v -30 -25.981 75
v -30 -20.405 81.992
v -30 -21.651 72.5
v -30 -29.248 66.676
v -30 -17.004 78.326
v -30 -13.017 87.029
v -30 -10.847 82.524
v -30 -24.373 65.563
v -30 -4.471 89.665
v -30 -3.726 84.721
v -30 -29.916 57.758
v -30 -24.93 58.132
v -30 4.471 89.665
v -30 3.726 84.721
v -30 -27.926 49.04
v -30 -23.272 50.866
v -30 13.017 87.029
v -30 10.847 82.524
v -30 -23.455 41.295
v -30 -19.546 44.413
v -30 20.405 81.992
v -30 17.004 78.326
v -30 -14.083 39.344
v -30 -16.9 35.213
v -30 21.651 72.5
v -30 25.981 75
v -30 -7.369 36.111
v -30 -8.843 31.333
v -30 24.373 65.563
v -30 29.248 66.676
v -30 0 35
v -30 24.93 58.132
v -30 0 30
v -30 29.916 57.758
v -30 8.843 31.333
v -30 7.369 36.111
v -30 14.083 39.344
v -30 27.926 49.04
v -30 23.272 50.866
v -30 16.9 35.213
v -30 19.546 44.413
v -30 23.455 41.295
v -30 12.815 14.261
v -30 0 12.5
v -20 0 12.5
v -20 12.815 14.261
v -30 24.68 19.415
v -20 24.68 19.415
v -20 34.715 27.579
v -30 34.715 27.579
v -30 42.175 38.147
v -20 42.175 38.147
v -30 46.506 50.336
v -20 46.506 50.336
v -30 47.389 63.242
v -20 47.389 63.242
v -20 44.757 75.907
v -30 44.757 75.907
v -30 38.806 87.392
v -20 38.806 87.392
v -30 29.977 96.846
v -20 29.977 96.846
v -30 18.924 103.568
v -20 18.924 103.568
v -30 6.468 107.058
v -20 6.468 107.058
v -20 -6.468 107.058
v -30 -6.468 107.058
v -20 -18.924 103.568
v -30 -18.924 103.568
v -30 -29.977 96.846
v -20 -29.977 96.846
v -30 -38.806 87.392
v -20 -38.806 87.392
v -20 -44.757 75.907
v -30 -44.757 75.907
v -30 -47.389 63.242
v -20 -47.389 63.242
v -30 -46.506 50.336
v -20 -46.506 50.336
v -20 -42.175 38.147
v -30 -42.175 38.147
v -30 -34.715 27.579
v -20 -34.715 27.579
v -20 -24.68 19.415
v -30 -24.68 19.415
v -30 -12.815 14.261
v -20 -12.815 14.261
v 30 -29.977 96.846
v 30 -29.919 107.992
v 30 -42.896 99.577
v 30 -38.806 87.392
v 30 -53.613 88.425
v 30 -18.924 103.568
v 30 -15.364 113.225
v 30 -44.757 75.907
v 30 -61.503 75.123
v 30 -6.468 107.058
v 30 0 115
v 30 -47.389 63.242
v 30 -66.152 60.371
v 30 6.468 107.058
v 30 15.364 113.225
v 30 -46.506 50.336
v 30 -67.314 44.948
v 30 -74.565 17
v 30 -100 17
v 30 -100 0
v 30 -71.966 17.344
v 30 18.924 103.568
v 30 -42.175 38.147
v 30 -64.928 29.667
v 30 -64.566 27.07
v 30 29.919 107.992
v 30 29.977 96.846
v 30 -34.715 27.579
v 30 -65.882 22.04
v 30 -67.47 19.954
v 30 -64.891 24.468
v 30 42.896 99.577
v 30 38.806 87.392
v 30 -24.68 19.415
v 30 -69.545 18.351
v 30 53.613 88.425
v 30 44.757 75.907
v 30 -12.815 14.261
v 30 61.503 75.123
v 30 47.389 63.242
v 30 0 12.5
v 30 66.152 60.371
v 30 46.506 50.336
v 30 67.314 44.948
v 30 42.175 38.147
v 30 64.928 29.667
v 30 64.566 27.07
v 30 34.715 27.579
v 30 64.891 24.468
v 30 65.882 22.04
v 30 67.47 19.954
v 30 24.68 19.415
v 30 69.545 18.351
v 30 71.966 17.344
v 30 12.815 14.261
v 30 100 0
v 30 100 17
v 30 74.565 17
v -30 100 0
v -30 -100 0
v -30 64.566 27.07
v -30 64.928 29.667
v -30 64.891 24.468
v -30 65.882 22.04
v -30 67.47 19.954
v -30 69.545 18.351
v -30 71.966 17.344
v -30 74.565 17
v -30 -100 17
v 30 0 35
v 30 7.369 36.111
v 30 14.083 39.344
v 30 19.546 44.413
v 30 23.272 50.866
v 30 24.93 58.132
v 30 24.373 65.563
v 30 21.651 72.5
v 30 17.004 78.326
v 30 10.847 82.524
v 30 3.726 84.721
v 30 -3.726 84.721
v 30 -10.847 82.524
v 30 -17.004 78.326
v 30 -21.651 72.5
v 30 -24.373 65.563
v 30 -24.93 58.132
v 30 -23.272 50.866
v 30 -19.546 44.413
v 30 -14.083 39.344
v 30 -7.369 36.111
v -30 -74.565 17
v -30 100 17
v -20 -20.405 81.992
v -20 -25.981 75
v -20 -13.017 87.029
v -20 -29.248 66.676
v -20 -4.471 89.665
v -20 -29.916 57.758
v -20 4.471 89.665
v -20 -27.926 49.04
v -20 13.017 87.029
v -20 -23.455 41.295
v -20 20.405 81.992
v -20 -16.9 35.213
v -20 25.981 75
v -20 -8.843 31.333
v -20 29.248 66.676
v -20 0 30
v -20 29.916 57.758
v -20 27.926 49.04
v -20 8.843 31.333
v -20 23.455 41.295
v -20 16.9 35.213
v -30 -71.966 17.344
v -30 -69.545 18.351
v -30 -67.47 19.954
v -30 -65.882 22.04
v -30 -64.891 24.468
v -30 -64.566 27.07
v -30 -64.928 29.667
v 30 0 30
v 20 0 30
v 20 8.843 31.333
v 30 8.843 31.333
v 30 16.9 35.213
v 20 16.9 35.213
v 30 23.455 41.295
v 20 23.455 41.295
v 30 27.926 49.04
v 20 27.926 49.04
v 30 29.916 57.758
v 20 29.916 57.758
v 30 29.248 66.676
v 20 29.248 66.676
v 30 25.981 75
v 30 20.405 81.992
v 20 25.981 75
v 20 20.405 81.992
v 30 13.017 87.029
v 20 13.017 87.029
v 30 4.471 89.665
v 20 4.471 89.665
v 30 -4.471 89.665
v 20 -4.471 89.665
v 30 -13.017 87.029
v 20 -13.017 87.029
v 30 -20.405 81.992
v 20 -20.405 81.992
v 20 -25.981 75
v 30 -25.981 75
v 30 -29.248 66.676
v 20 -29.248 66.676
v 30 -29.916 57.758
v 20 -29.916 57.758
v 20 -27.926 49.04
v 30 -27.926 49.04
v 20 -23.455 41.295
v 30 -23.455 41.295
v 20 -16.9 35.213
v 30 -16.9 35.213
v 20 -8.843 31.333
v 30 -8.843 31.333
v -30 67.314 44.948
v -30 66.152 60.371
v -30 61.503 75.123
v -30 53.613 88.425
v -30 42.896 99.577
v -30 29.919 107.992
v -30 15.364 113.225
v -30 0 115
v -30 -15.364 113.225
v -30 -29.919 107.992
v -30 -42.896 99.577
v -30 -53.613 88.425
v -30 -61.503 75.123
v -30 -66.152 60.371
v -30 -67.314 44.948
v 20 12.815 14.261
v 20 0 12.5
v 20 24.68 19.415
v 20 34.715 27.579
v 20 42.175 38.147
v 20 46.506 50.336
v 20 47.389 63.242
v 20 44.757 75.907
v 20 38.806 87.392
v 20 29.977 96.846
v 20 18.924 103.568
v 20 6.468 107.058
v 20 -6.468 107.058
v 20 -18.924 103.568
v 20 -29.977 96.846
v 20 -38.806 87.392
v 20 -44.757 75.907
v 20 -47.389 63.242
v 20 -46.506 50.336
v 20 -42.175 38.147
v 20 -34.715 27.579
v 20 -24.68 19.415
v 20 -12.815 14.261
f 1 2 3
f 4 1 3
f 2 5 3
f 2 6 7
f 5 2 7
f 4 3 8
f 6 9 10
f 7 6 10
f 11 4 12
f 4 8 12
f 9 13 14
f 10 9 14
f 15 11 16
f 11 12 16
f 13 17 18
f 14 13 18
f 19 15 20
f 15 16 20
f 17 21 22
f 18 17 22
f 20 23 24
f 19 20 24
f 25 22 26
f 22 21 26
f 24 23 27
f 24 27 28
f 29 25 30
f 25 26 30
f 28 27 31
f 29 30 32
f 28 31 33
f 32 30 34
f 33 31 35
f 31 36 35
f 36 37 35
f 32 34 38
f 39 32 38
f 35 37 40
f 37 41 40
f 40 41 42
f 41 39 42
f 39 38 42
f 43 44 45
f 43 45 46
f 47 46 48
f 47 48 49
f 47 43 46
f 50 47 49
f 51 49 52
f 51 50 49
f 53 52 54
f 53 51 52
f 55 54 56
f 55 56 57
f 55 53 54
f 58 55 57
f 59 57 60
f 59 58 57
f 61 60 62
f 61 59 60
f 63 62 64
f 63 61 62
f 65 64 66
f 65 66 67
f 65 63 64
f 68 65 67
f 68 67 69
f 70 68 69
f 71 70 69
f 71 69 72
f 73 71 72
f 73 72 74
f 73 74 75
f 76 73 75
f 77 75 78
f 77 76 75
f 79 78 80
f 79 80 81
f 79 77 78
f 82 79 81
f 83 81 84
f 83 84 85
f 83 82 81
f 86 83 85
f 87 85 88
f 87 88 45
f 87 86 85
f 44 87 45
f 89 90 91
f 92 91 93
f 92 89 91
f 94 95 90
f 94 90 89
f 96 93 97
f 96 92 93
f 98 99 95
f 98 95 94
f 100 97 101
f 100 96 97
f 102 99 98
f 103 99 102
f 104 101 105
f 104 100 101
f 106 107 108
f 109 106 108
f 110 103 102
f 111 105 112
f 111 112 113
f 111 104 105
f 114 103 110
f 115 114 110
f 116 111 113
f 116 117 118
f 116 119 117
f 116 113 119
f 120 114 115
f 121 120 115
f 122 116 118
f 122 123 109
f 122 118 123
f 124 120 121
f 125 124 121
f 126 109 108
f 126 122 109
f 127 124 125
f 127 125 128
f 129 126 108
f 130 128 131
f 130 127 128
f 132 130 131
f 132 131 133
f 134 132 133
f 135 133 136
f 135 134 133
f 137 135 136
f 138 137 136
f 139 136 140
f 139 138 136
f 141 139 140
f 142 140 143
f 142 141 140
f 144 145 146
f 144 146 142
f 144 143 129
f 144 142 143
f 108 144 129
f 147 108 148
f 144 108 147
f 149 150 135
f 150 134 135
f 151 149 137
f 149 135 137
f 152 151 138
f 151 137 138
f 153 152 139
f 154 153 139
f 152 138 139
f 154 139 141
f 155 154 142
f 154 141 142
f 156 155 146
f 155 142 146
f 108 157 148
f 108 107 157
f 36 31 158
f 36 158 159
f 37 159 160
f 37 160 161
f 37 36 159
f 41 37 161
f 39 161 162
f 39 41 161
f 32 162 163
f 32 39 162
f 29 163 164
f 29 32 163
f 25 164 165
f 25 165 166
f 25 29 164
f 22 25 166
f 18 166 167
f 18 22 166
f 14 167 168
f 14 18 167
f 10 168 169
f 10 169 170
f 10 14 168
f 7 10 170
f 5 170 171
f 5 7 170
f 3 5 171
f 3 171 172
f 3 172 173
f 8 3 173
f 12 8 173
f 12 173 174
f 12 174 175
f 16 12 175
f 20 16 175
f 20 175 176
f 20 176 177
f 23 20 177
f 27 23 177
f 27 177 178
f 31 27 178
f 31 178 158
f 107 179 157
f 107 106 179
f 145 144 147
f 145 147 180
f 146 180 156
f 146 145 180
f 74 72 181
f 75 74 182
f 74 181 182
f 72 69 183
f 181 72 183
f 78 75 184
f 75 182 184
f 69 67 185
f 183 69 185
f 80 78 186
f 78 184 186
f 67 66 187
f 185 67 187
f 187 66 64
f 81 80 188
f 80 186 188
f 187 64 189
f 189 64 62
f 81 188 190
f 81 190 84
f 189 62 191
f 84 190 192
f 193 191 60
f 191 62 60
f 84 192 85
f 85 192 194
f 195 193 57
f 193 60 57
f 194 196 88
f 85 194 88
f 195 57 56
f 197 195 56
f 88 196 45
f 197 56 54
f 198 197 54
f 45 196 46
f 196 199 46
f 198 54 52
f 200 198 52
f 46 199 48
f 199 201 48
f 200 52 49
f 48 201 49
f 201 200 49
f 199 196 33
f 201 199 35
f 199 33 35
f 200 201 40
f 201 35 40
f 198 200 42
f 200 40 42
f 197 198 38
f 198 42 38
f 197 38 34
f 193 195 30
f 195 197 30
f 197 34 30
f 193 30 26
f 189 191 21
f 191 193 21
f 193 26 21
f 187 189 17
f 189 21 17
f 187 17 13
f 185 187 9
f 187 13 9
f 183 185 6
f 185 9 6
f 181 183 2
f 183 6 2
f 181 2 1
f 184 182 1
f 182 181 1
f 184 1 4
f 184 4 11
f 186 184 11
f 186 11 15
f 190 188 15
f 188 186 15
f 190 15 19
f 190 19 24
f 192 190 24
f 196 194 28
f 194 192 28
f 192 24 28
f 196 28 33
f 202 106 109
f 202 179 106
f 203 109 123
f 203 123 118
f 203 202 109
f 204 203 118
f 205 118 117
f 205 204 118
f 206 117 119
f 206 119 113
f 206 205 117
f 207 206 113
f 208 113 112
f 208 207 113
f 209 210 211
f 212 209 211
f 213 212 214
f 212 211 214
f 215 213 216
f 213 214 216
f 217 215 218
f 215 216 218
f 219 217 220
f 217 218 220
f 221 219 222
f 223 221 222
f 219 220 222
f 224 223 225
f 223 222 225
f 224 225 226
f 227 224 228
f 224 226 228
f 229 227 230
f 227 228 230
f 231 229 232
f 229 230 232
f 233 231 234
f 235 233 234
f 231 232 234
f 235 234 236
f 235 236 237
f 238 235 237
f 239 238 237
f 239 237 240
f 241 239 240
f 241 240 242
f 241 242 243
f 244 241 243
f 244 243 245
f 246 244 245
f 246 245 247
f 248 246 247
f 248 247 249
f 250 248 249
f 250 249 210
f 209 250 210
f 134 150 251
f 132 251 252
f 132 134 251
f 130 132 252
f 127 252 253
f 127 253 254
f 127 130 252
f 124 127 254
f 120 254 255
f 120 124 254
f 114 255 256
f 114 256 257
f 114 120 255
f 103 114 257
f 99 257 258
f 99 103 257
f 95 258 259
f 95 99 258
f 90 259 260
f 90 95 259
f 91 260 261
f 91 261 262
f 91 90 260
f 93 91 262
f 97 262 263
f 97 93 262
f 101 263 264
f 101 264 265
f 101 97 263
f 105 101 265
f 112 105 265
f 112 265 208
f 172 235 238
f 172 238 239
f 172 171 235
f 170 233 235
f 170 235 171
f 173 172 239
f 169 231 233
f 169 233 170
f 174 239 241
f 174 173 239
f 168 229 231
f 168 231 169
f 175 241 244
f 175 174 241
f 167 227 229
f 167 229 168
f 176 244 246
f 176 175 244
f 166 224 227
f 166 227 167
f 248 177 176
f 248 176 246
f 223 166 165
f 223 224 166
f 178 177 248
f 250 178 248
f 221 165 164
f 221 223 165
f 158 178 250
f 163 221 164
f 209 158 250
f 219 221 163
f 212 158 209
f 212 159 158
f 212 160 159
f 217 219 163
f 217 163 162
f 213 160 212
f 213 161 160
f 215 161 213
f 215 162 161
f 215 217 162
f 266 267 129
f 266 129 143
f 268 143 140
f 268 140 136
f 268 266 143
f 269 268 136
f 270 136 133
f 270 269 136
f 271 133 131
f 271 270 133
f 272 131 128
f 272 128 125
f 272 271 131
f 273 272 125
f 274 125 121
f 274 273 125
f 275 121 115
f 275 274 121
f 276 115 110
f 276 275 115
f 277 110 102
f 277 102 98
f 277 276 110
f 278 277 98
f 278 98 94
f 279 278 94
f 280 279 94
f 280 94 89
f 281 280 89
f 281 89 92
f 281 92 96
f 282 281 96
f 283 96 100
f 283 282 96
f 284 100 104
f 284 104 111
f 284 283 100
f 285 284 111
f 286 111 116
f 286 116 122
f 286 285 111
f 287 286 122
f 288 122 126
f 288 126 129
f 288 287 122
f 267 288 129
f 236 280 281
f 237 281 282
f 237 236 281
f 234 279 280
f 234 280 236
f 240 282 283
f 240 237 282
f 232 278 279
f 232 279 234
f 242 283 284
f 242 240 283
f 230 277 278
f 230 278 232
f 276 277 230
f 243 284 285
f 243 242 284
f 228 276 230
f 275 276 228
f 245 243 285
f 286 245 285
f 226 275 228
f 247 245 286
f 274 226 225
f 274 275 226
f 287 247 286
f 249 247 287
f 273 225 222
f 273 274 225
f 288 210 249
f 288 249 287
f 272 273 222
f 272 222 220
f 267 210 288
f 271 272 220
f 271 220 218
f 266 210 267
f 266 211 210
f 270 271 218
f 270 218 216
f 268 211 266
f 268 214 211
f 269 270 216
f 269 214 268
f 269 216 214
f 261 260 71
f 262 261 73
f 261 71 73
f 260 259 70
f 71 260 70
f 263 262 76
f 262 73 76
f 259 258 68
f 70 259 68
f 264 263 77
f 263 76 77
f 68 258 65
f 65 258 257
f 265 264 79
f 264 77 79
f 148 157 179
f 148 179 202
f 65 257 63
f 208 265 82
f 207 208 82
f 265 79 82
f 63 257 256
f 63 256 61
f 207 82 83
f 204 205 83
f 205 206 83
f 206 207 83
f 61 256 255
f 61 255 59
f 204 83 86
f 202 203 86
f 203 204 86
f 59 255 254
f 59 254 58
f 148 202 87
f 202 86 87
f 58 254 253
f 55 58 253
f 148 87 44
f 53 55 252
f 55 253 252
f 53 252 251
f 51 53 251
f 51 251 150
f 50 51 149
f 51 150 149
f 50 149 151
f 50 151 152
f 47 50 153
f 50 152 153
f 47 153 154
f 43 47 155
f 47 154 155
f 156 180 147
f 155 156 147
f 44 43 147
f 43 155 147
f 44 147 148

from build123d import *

# Parameters (mm, degrees)
BOSS_EXTRUDE1_DEPTH      = 30
FILLET1_R                = 10
CUT_EXTRUDE1_DEPTH       = 156.32224567
CUT_EXTRUDE1_DEPTH_BACK  = 156.32224567
SKETCH2_R                = 25
CUT_EXTRUDE2_START       = -30
SKETCH3_R                = 47.5
CUT_EXTRUDE2_DEPTH       = 10
CUT_EXTRUDE3_START       = 20
SKETCH3_3_R              = 47.5
CUT_EXTRUDE3_DEPTH       = 10
BOSS_EXTRUDE2_DEPTH      = 30
BOSS_EXTRUDE2_DEPTH_BACK = 30
SKETCH4_R                = 30
SKETCH4_R_2              = 25


with BuildPart() as part:
    # Sketch1 → Boss-Extrude1 (new, symmetric)
    with BuildSketch(Plane(origin=(0, 0, 0), x_dir=(0, 0, -1), z_dir=(1, 0, 0))):
        with BuildLine():
            Line((0, -100), (0, 100))
            Line((0, 100), (-17, 100))
            Line((-17, 100), (-17, 60))
            ThreePointArc((-17, 60), (-115, 0), (-17, -60))
            Line((-17, -60), (-17, -100))
            Line((-17, -100), (0, -100))
        make_face()
    extrude(amount=BOSS_EXTRUDE1_DEPTH, both=True)

    # Fillet1
    fillet1_edges = [part.edges().sort_by_distance(p)[0] for p in [
        (0, -60, 17),
        (0, 60, 17),
    ]]
    fillet(fillet1_edges, radius=FILLET1_R)

    # Sketch2 → Cut-Extrude1 (cut, two sides: drawn at the far end of the back side and taken through both)
    with BuildSketch(Plane(origin=(0, 0, 0), x_dir=(0, 0, -1), z_dir=(1, 0, 0)).offset(-CUT_EXTRUDE1_DEPTH_BACK)):
        with Locations((-60, 0)):
            Circle(SKETCH2_R)
    extrude(amount=CUT_EXTRUDE1_DEPTH + CUT_EXTRUDE1_DEPTH_BACK, mode=Mode.SUBTRACT)

    # Sketch3 → Cut-Extrude2 (cut)
    with BuildSketch(Plane(origin=(0, 0, 0), x_dir=(0, 0, -1), z_dir=(1, 0, 0)).offset(CUT_EXTRUDE2_START)):
        with Locations((-60, 0)):
            Circle(SKETCH3_R)
    extrude(amount=CUT_EXTRUDE2_DEPTH, mode=Mode.SUBTRACT)

    # Sketch3<3> → Cut-Extrude3 (cut)
    with BuildSketch(Plane(origin=(0, 0, 0), x_dir=(0, 0, -1), z_dir=(1, 0, 0)).offset(CUT_EXTRUDE3_START)):
        with Locations((-60, 0)):
            Circle(SKETCH3_3_R)
    extrude(amount=CUT_EXTRUDE3_DEPTH, mode=Mode.SUBTRACT)

    # Sketch4 → Boss-Extrude2 (add, two sides: drawn at the far end of the back side and taken through both)
    with BuildSketch(Plane(origin=(0, 0, 0), x_dir=(0, 0, -1), z_dir=(1, 0, 0)).offset(-BOSS_EXTRUDE2_DEPTH_BACK)):
        with Locations((-60, 0)):
            Circle(SKETCH4_R)
        with Locations((-60, 0)):
            Circle(SKETCH4_R_2, mode=Mode.SUBTRACT)
    extrude(amount=BOSS_EXTRUDE2_DEPTH + BOSS_EXTRUDE2_DEPTH_BACK)


solid = part.part
